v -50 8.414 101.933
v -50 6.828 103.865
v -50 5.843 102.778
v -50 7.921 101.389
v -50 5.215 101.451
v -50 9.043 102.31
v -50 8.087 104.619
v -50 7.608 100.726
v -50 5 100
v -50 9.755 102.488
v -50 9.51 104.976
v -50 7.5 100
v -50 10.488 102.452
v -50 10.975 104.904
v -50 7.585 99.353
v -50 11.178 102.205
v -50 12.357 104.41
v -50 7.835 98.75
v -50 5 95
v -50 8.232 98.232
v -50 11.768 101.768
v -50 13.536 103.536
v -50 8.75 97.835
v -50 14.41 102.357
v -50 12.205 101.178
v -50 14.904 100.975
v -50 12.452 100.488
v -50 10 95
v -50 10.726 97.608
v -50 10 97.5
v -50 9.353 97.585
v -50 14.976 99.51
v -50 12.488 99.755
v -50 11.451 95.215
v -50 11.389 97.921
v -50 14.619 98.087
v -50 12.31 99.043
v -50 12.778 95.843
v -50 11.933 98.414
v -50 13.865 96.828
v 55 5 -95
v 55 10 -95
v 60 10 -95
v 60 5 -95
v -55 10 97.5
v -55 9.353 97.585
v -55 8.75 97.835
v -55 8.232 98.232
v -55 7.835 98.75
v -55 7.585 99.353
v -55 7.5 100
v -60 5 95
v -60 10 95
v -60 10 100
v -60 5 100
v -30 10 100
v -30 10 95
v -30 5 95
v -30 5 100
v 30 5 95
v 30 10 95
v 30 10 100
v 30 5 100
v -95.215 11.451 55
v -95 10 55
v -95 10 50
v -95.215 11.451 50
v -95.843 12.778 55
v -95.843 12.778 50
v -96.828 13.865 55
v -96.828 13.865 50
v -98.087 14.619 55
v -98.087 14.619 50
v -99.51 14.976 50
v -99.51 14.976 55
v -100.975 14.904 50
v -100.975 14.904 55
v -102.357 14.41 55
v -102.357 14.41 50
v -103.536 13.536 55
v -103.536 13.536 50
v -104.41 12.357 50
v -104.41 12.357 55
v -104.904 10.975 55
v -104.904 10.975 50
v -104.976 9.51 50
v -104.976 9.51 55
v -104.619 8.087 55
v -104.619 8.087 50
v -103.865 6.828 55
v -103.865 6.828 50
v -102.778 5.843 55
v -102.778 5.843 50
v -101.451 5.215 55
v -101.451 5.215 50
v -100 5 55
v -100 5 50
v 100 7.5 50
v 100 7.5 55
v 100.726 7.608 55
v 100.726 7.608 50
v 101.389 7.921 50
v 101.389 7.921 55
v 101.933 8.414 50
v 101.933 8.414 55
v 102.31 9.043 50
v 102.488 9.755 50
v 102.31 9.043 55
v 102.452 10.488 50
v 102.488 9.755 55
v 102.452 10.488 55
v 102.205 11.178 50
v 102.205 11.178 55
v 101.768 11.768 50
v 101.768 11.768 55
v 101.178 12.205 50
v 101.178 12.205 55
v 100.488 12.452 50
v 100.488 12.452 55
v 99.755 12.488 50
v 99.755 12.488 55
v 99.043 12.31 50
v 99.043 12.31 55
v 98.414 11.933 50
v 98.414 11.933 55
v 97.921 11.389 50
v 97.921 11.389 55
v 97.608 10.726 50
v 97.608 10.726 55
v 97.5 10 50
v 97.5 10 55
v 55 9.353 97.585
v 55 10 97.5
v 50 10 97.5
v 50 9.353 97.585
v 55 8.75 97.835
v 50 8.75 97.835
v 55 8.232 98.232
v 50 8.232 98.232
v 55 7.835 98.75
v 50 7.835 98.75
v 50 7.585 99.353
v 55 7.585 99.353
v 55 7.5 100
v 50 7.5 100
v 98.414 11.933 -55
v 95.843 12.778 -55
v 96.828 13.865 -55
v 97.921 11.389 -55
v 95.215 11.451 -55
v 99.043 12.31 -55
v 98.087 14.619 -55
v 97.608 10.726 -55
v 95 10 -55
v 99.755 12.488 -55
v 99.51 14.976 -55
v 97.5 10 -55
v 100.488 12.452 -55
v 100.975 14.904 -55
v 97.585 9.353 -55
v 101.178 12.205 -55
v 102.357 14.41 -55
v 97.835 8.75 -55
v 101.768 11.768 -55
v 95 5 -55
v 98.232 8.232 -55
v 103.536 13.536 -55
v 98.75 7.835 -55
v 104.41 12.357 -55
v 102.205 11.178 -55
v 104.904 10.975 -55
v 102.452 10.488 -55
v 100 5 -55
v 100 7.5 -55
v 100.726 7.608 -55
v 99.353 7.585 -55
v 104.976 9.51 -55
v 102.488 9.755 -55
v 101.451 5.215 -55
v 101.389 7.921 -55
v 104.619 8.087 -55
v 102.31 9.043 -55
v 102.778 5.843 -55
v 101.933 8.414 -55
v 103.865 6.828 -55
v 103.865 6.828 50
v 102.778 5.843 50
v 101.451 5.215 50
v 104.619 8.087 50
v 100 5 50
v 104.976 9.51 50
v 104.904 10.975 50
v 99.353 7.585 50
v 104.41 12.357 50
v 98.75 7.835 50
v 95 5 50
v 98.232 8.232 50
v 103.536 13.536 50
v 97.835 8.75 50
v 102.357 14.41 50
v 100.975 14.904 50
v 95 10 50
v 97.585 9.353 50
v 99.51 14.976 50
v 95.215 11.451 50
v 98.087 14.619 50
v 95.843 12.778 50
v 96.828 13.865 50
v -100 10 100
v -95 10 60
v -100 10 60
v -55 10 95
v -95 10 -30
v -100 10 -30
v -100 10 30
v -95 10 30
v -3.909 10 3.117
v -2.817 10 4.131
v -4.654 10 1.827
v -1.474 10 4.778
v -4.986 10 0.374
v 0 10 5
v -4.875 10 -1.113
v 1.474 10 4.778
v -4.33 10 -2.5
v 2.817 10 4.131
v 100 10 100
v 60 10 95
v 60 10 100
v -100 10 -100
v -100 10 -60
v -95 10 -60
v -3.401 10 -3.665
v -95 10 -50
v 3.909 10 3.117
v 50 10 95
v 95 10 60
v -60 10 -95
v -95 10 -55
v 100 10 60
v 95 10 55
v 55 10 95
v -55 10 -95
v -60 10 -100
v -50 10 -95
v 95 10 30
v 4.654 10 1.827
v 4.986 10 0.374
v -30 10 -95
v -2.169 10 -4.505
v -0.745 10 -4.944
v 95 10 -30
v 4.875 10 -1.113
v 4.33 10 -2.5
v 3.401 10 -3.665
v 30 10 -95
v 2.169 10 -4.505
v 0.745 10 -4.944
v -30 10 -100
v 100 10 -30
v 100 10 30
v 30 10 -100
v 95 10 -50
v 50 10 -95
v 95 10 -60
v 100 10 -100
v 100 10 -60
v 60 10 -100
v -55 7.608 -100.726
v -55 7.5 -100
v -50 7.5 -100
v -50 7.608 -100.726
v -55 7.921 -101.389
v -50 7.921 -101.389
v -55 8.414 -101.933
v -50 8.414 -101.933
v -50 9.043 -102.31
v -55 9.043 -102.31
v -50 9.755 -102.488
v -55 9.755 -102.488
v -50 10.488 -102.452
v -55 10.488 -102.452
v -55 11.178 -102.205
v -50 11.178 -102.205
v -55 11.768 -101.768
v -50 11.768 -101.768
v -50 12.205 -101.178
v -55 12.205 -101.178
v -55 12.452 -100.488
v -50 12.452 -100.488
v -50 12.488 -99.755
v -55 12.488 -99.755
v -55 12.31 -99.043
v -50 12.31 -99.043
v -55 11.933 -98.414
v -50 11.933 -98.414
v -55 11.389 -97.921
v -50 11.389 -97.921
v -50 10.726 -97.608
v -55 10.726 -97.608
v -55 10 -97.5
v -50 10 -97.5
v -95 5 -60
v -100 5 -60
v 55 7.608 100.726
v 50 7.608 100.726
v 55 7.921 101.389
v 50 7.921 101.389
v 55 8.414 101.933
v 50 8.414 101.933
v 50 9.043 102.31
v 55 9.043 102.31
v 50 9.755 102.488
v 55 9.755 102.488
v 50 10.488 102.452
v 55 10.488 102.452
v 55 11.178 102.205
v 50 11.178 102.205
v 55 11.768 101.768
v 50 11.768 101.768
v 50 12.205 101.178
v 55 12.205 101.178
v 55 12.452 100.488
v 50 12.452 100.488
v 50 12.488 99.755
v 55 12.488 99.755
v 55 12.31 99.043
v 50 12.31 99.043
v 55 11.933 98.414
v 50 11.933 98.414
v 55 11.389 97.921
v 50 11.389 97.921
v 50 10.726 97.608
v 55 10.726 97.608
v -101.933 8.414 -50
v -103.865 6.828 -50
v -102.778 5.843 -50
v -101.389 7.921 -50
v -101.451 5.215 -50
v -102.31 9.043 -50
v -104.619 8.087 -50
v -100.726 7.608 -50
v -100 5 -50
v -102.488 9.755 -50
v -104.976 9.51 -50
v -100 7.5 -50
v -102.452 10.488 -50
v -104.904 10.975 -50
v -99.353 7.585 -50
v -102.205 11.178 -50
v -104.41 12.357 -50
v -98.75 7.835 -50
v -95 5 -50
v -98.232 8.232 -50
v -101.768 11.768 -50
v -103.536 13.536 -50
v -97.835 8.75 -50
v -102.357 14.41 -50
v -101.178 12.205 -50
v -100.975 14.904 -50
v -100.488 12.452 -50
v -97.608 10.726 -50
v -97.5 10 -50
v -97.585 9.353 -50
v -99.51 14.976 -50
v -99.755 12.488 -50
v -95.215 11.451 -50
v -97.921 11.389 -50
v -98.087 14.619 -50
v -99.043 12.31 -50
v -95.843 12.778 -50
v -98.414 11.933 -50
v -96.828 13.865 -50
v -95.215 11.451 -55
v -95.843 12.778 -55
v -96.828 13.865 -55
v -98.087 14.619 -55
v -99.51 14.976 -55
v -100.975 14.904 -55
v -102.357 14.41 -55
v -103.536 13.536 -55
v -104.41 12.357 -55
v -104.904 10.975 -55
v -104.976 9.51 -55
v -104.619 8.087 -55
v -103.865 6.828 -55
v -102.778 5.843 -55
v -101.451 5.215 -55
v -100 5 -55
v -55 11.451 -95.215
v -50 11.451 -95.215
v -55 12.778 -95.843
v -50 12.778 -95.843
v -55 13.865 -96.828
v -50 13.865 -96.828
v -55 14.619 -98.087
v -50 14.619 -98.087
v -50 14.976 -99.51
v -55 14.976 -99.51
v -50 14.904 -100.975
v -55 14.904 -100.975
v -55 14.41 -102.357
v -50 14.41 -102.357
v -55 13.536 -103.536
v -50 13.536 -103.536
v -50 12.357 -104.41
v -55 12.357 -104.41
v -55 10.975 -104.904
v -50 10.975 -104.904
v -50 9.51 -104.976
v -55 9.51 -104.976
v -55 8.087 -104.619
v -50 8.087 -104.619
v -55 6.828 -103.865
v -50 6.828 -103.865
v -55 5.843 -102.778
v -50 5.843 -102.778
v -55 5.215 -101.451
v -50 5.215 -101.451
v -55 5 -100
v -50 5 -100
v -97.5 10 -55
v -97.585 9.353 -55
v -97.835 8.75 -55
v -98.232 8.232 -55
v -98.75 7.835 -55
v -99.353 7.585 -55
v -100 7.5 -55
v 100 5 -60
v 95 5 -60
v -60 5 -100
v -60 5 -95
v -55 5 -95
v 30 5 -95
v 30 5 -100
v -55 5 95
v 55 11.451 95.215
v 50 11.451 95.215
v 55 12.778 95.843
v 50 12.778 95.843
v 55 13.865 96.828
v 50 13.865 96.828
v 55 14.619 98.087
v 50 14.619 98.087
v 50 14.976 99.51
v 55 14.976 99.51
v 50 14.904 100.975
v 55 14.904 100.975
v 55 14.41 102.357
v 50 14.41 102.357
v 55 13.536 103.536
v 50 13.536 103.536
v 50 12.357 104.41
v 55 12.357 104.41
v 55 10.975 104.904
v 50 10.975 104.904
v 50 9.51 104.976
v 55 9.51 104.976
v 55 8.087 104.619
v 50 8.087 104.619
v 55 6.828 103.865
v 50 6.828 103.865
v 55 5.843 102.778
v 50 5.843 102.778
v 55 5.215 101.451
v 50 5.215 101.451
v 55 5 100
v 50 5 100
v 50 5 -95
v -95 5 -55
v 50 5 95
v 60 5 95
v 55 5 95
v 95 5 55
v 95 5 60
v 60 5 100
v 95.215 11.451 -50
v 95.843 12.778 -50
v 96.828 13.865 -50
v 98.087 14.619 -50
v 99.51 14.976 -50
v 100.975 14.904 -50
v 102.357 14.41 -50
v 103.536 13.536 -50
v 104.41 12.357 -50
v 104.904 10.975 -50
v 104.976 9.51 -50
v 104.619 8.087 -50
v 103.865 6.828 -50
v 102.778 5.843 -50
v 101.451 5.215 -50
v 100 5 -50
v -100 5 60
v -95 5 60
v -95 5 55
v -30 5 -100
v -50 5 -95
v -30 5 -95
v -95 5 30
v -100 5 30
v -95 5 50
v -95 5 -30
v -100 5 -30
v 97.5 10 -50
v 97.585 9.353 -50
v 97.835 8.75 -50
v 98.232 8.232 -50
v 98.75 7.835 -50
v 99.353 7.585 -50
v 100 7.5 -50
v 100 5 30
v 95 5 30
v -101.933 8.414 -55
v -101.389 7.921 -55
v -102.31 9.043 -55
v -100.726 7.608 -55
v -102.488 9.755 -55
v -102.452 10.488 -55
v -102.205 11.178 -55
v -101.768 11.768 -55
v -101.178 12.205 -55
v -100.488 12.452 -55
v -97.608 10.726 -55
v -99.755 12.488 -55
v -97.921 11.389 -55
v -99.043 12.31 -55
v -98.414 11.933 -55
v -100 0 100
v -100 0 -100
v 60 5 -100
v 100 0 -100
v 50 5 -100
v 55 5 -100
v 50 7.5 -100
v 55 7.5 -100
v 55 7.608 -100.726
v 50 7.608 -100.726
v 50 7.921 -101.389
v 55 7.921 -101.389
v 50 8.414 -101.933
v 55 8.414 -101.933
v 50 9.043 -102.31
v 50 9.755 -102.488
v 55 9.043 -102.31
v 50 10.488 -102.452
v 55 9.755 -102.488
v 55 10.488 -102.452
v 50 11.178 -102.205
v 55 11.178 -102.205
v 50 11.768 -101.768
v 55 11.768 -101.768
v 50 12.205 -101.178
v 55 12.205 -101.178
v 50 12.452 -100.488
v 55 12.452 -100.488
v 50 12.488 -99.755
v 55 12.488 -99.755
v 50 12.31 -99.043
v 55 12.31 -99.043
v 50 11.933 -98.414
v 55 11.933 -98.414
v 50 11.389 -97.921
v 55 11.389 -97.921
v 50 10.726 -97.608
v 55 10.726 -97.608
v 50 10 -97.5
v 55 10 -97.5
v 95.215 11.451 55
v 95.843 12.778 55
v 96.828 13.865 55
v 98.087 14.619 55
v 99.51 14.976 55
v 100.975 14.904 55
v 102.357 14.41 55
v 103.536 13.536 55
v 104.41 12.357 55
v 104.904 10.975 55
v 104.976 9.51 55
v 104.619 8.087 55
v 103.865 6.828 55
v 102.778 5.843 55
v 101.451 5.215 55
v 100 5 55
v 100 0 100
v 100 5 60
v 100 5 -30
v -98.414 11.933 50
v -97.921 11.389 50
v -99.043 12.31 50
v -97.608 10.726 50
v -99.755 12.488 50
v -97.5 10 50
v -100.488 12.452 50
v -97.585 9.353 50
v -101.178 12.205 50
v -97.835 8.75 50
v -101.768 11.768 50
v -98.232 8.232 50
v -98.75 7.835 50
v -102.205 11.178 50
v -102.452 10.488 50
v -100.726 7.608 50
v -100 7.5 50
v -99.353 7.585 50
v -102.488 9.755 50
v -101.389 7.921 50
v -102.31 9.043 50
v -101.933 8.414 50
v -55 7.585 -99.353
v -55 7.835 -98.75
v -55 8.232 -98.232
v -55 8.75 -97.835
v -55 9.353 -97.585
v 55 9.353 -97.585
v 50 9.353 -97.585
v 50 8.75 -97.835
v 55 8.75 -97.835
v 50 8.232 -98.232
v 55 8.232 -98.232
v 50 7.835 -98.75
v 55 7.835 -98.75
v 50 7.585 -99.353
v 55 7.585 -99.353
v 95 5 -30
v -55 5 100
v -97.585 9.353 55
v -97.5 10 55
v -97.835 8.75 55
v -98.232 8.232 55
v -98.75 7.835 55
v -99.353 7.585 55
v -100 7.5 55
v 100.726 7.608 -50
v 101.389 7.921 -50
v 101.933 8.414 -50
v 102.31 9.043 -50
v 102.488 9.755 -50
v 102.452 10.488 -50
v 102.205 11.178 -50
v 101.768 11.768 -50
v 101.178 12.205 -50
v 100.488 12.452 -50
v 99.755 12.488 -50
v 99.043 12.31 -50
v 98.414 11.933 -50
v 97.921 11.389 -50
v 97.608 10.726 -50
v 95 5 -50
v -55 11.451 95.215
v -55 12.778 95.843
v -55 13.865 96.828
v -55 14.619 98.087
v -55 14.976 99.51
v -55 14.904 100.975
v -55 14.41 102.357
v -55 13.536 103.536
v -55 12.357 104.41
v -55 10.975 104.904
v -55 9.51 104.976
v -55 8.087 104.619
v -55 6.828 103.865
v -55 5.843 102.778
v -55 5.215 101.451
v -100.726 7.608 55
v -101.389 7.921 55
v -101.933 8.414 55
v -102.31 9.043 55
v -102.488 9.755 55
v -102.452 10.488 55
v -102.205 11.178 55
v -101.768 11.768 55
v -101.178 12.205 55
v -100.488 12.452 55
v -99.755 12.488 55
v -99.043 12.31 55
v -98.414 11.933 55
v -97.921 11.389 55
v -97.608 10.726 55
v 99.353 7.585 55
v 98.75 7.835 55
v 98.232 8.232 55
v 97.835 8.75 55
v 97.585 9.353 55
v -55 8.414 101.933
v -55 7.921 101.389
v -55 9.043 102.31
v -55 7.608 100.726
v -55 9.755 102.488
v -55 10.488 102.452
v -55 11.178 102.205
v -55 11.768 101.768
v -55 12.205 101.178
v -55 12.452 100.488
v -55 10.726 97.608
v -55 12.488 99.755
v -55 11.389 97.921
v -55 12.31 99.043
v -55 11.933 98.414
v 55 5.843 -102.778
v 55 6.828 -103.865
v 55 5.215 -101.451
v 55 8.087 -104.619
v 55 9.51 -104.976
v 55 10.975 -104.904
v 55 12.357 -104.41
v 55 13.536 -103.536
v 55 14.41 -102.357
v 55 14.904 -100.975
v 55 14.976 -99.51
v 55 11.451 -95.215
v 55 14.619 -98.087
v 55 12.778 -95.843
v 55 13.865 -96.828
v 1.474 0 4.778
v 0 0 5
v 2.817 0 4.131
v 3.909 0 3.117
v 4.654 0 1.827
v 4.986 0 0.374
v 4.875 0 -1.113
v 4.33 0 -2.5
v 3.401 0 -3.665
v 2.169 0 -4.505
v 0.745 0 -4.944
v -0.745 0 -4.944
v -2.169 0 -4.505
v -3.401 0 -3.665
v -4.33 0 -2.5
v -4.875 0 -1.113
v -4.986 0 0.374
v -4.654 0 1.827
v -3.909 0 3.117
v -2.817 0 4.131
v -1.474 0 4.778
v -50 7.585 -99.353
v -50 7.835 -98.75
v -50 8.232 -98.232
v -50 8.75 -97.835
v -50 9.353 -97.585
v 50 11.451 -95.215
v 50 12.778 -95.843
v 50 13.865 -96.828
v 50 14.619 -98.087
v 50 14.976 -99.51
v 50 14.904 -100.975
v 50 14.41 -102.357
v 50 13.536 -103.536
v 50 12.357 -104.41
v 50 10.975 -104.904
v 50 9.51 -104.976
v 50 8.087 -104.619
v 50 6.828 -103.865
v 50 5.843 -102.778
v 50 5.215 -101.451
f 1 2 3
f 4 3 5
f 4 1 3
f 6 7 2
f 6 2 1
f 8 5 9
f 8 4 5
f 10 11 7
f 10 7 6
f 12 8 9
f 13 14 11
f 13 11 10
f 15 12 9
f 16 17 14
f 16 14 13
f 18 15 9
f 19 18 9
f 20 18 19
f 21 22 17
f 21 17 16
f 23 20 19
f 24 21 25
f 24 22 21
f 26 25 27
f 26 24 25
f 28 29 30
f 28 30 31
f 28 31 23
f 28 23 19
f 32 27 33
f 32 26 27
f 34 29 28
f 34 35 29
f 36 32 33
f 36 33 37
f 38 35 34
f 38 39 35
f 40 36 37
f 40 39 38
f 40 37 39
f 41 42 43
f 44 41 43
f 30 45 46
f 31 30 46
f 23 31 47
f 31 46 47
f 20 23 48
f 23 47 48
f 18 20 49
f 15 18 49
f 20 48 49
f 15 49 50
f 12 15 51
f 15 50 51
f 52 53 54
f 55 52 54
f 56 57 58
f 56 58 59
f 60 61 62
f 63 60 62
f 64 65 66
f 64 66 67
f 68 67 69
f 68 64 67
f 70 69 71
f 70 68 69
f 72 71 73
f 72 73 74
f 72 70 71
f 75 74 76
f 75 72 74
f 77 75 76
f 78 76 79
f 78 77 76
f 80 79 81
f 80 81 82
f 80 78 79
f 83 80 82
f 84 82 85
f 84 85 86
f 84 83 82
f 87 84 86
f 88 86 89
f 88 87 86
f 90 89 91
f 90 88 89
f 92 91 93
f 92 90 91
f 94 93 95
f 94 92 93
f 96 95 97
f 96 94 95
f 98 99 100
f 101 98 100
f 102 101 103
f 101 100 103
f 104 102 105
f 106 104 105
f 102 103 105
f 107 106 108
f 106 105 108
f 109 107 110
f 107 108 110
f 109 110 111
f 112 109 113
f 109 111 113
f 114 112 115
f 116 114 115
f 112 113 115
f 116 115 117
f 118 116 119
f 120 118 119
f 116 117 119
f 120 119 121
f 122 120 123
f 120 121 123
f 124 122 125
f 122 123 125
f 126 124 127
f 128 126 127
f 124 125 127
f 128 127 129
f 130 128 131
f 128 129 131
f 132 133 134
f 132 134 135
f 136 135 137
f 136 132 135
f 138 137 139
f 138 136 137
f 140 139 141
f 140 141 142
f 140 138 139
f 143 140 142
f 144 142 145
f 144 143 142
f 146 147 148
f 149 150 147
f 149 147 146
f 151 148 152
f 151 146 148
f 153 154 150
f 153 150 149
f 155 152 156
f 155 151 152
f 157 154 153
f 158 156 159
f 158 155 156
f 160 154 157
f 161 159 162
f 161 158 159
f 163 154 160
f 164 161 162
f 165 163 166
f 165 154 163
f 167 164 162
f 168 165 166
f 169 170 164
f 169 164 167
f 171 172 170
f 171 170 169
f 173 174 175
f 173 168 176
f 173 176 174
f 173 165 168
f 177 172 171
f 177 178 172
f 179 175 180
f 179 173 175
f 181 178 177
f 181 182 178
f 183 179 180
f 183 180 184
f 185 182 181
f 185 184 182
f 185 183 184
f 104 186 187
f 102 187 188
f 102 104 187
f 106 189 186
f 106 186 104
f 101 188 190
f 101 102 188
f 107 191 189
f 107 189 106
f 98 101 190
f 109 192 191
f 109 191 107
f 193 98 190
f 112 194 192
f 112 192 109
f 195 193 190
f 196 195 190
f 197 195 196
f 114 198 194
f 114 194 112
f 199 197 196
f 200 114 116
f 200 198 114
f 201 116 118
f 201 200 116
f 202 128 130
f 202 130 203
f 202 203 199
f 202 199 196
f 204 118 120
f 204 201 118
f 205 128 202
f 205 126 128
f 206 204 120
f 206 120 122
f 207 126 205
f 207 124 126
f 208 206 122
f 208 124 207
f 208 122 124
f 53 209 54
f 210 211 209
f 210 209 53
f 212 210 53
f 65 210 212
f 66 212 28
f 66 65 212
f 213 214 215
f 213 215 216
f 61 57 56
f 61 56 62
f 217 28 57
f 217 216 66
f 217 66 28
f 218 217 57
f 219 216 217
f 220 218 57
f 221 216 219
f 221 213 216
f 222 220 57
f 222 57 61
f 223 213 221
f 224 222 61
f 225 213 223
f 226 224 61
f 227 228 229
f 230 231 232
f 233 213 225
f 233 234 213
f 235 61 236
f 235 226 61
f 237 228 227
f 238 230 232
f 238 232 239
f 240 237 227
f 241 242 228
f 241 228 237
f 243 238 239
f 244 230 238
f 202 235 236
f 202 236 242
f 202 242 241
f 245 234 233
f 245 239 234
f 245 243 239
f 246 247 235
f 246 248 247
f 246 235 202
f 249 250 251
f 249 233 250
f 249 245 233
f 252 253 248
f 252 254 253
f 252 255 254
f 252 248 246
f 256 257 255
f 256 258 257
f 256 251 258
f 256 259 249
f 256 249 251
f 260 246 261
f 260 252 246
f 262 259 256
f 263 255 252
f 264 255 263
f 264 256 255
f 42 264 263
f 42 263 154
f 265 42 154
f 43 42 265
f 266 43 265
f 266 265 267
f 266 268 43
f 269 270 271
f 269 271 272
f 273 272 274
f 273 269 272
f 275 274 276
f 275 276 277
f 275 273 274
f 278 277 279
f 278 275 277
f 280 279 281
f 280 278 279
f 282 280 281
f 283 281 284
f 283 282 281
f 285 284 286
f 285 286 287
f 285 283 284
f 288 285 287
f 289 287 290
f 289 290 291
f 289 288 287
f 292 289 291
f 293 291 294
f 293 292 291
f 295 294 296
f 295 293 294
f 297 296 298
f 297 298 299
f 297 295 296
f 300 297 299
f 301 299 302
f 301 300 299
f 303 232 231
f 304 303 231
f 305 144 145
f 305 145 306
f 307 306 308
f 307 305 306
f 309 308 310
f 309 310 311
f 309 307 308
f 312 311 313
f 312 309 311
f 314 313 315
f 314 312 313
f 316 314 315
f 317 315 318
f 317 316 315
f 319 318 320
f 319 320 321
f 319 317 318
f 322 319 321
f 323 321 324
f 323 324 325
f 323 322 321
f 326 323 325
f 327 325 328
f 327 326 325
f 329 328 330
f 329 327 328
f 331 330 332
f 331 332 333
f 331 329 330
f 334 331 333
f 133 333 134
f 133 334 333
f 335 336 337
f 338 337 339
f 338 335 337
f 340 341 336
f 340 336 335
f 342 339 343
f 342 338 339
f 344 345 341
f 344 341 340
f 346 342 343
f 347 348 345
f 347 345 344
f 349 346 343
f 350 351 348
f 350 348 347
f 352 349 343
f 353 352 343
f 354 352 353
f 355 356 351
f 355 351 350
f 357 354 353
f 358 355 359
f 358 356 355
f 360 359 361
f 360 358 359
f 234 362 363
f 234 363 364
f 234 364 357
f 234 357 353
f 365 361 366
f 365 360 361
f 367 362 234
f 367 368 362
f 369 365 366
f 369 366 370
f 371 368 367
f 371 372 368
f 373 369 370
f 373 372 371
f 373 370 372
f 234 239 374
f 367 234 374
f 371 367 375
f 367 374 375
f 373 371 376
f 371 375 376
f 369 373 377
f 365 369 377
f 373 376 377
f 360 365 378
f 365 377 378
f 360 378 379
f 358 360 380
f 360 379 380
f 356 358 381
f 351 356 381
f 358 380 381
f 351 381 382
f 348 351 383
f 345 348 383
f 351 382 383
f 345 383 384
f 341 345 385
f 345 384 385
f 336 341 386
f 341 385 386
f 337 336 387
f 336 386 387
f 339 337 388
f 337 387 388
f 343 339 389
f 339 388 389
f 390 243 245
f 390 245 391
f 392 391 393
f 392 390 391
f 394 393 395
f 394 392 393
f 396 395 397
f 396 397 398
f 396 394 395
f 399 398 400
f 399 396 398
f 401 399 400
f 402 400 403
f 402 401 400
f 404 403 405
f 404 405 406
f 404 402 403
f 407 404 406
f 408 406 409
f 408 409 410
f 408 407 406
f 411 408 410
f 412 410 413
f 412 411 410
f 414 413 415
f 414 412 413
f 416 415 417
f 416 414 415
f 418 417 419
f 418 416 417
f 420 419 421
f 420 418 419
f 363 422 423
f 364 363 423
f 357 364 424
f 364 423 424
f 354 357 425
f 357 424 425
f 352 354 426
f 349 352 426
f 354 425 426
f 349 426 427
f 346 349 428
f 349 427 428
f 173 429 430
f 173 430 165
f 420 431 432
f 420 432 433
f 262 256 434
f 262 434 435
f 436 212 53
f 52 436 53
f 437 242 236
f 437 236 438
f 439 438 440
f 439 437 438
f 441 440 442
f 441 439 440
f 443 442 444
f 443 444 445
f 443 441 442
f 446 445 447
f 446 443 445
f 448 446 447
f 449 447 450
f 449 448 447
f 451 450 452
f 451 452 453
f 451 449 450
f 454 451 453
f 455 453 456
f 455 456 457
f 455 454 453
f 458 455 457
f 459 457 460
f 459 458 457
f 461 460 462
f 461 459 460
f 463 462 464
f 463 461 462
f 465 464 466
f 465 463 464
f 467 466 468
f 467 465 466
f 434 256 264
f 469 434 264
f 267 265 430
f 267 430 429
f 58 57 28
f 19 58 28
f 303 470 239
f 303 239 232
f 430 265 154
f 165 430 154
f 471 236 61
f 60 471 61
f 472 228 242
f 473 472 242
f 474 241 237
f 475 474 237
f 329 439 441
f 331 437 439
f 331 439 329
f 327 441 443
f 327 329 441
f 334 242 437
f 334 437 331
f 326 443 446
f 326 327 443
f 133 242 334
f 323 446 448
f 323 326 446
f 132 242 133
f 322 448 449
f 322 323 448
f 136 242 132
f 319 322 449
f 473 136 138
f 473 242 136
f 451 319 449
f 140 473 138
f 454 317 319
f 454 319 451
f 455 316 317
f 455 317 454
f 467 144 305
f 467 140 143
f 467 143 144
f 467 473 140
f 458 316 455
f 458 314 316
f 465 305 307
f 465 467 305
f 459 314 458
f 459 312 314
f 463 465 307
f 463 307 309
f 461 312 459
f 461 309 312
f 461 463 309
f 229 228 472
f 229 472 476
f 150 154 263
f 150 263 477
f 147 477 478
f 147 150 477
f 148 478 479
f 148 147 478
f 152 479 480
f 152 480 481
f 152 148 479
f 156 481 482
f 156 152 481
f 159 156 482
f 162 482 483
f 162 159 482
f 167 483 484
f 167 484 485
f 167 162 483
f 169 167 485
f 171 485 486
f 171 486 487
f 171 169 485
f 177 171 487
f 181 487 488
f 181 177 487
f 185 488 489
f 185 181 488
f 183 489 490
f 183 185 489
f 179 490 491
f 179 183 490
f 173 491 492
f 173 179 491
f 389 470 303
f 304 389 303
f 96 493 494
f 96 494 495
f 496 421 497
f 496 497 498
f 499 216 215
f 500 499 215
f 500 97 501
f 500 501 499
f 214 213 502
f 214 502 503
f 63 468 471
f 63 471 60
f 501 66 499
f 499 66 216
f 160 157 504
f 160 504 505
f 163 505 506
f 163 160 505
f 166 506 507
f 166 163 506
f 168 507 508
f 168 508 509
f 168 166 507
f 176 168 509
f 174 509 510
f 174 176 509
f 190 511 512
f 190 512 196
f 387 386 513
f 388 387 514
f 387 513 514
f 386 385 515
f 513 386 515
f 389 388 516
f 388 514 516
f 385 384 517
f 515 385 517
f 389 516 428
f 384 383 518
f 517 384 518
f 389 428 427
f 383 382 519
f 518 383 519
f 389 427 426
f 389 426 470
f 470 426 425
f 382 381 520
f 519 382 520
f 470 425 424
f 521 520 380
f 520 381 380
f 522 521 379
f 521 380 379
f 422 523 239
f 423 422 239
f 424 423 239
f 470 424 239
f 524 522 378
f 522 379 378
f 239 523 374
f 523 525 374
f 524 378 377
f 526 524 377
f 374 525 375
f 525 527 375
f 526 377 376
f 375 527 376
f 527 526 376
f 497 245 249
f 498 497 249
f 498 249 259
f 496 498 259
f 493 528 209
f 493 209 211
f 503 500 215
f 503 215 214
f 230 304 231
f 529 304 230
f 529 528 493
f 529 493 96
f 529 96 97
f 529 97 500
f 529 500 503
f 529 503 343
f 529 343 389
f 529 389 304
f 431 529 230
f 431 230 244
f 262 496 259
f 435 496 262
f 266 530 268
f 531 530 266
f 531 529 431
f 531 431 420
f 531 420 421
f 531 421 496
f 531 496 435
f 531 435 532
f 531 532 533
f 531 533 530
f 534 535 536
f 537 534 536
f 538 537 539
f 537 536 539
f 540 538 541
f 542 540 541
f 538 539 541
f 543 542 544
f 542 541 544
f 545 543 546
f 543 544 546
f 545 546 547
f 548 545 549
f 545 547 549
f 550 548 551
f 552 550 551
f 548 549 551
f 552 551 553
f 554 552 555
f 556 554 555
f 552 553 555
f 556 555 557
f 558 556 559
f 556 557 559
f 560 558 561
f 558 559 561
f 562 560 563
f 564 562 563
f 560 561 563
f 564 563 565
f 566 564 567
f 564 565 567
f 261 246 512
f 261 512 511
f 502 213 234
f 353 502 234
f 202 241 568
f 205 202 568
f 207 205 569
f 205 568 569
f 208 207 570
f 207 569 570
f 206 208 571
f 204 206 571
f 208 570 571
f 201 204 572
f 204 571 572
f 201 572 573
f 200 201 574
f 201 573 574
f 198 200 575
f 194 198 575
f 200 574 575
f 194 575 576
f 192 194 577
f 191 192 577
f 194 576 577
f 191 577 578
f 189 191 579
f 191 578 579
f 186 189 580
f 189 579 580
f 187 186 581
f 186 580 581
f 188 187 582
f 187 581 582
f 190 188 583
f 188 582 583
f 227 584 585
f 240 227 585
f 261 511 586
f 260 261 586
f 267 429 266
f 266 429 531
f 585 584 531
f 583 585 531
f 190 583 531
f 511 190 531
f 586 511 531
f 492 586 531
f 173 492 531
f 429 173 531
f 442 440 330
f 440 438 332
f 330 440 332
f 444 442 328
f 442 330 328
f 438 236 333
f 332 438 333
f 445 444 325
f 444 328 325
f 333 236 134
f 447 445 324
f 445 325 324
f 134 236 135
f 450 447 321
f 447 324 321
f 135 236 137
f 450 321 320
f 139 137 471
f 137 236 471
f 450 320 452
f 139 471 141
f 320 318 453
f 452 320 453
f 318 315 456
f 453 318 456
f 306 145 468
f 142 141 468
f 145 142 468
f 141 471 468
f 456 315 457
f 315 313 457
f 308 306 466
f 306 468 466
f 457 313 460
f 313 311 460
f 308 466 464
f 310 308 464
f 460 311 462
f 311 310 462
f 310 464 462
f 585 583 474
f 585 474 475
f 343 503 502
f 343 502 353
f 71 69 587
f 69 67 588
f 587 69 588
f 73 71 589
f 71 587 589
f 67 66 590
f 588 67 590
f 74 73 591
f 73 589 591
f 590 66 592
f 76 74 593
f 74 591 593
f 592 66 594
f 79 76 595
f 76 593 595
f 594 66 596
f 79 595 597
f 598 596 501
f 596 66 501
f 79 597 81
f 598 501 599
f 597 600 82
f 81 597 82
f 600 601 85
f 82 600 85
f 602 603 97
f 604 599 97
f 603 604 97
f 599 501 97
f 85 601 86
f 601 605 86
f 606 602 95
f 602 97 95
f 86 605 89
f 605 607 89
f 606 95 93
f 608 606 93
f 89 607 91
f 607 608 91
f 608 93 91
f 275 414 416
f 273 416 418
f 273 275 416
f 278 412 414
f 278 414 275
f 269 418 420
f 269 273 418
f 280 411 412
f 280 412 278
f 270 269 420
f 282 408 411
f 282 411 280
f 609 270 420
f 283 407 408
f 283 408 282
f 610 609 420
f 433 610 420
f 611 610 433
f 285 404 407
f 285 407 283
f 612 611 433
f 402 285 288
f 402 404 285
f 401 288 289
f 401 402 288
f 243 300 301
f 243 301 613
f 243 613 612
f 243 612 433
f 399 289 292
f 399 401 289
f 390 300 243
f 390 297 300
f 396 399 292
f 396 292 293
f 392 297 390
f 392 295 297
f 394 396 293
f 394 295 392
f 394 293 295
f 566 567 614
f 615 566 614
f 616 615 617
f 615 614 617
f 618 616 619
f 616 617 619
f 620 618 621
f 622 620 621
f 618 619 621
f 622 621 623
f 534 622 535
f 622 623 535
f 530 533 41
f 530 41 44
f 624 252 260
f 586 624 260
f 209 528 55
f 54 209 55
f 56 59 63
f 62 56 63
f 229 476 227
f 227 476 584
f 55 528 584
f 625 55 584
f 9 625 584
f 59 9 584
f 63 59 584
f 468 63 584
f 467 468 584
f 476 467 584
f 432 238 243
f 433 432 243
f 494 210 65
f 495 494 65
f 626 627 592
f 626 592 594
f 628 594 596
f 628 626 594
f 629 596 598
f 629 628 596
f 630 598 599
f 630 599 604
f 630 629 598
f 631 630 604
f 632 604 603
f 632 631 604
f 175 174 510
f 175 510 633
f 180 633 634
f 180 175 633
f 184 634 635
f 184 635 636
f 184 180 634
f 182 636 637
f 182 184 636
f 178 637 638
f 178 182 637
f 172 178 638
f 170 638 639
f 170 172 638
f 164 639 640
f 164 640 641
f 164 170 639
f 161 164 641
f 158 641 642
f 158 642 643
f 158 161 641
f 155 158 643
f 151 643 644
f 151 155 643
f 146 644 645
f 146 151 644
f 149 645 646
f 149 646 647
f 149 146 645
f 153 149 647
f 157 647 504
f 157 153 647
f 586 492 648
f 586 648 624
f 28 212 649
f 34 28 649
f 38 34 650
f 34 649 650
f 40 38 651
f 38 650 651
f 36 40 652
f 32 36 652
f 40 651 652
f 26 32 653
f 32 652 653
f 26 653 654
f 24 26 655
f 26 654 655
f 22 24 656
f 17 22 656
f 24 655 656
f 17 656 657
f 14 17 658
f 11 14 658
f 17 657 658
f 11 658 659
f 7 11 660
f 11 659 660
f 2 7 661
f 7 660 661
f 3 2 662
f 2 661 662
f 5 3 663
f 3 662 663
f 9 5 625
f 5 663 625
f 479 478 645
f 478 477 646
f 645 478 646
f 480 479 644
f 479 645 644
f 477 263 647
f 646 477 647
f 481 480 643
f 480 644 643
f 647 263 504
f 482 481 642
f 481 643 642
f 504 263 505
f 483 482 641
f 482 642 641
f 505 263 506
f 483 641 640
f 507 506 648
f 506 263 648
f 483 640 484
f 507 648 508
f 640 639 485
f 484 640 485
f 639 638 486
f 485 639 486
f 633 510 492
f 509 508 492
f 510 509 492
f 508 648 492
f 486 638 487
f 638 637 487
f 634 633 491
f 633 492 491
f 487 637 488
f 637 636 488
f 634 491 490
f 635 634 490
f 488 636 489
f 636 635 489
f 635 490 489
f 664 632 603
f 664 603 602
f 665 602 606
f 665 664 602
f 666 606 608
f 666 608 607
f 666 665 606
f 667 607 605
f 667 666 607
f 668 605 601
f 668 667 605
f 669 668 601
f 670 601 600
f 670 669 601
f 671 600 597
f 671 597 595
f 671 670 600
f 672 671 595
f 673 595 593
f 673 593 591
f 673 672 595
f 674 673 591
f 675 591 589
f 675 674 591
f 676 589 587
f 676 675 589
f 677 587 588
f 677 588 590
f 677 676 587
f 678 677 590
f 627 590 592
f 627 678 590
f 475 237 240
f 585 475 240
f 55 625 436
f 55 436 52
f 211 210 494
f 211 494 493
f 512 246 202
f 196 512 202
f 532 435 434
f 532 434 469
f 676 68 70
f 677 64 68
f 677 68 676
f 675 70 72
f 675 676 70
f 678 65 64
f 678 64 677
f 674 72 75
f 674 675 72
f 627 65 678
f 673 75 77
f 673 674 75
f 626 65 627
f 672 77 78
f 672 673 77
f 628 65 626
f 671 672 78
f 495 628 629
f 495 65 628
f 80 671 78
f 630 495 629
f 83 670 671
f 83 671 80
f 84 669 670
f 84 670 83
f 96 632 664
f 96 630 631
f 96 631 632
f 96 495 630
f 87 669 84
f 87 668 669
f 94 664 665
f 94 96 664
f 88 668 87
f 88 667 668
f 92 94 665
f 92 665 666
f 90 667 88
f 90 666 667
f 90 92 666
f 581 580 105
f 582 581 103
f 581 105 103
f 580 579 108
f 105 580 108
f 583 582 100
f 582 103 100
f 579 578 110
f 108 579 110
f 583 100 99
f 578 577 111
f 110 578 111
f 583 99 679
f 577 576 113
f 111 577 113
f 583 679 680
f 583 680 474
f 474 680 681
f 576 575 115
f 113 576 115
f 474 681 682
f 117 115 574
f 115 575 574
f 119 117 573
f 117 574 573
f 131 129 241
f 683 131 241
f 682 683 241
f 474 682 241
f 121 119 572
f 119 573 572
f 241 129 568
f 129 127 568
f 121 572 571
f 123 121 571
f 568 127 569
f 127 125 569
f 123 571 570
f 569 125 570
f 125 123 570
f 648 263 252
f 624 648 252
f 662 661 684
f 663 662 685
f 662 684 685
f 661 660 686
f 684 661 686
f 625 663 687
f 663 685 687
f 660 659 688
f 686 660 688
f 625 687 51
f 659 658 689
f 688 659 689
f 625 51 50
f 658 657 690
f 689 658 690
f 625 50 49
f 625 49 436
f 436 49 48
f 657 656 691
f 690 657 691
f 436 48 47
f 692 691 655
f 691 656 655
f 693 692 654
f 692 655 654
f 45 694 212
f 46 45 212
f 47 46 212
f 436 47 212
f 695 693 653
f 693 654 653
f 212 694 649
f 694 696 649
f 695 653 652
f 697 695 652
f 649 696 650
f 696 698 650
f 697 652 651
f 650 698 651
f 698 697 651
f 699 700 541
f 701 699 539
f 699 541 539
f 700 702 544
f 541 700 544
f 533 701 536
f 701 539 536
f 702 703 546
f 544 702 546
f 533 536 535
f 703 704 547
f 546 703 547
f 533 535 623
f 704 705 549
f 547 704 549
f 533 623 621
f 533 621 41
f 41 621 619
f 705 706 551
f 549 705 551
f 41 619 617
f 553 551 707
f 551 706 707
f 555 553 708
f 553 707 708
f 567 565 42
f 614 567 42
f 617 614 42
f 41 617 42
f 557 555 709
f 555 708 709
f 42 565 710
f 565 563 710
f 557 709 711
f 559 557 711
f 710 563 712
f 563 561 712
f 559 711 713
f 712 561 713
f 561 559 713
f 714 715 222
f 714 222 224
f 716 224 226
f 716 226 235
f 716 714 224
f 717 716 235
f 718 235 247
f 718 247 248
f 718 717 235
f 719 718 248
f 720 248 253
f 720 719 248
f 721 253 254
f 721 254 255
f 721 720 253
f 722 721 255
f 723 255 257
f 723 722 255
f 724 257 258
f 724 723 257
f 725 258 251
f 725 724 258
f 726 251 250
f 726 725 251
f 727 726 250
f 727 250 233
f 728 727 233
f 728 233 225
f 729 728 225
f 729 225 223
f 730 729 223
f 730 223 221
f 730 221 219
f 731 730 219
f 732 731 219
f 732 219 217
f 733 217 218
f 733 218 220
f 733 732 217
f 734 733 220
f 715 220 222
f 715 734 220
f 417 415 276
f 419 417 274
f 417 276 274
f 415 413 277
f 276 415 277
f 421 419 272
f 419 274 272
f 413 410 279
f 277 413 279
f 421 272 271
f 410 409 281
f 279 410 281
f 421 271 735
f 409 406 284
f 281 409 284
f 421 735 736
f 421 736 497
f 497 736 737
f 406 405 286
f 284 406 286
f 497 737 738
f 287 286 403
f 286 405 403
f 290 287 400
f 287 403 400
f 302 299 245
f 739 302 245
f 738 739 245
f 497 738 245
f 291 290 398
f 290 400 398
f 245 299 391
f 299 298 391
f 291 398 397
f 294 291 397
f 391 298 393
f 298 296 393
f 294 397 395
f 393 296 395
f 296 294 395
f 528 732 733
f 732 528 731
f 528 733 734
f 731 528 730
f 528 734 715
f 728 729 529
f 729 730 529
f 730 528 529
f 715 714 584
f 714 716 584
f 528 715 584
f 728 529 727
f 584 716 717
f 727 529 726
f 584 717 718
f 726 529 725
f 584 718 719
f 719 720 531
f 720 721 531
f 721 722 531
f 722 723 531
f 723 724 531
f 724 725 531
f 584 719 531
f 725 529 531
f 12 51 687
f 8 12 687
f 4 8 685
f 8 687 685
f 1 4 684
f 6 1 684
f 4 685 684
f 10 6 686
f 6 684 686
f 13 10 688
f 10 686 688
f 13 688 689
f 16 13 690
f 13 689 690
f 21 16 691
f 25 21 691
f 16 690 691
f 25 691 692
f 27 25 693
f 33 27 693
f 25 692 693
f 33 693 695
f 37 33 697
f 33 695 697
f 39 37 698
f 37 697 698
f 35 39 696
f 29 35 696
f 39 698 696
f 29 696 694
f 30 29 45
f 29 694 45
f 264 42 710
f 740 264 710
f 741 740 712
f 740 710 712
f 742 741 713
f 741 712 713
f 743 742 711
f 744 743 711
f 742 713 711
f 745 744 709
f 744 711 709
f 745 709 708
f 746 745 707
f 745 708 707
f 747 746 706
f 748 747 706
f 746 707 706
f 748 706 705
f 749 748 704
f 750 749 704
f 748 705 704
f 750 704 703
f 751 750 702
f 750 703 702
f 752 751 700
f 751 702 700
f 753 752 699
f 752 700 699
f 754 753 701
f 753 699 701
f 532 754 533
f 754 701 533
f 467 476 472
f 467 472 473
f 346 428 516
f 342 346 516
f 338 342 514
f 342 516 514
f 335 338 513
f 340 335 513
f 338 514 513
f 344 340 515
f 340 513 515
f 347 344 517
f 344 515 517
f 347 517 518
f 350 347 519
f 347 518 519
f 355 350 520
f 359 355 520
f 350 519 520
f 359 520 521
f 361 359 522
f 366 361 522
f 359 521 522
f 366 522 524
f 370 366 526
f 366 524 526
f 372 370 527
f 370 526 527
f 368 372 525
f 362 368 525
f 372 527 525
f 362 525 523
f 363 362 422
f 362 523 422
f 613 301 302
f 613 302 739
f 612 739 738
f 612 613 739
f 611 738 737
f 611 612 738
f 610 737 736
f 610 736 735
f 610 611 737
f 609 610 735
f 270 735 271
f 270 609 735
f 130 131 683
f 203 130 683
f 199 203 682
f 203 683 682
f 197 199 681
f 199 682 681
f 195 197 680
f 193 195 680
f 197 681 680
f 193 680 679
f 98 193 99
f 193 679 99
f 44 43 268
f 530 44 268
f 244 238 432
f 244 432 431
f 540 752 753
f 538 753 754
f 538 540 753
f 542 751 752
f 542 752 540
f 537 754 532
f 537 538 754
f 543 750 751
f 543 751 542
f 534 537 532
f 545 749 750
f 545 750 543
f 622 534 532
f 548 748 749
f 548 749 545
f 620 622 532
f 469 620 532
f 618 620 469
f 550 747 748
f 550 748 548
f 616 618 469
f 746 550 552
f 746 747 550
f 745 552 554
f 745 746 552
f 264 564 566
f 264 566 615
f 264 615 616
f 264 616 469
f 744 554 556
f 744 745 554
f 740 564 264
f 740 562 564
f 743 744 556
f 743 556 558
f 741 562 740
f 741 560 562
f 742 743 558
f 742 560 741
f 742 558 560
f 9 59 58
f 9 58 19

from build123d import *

# Parameters (mm, degrees)
SKETCH1_W                = 200
SKETCH1_H                = 200
SKETCH1_R                = 5
BOSS_EXTRUDE1_DEPTH      = 10
SKETCH2_W                = 30
SKETCH2_H                = 5
CUT_EXTRUDE1_DEPTH       = 5
BOSS_EXTRUDE3_START      = 5
BOSS_EXTRUDE3_DEPTH      = 5
CIRPATTERN1_COUNT        = 4
CIRPATTERN1_START        = 5
CIRPATTERN1_COPY_1_DEPTH = 5
CIRPATTERN1_COPY_2_DEPTH = 5
CIRPATTERN1_COPY_3_DEPTH = 5


with BuildPart() as part:
    # Sketch1 → Boss-Extrude1 (new body)
    with BuildSketch(Plane(origin=(0, 0, 0), x_dir=(1, 0, 0), z_dir=(0, 1, 0))):
        Rectangle(SKETCH1_W, SKETCH1_H)
        with Locations(Location((0, 0, 0), (0, 0, 270))):
            Circle(SKETCH1_R, mode=Mode.SUBTRACT)
    extrude(amount=BOSS_EXTRUDE1_DEPTH)

    # Sketch2 → Cut-Extrude1 (cut)
    with BuildSketch(Plane(origin=(0, 10, 0), x_dir=(1, 0, 0), z_dir=(0, 1, 0))):
        with Locations((45, 97.5)):
            Rectangle(SKETCH2_W, SKETCH2_H)
        with Locations((-45, 97.5)):
            Rectangle(SKETCH2_W, SKETCH2_H)
    cut_extrude1 = extrude(amount=-CUT_EXTRUDE1_DEPTH, mode=Mode.SUBTRACT)

    # Sketch3 → Boss-Extrude3 (add)
    with BuildSketch(Plane.ZY.offset(-60).offset(BOSS_EXTRUDE3_START)):
        with BuildLine():
            Line((-97.5, 10), (-95, 10))
            ThreePointArc((-95, 10), (-103.535533906, 13.535533906), (-100, 5))
            Line((-100, 5), (-100, 7.5))
            ThreePointArc((-100, 7.5), (-101.767766953, 11.767766953), (-97.5, 10))
        make_face()
        with BuildLine():
            ThreePointArc((-100, 5), (-96.464466094, 6.464466094), (-95, 10))
            Line((-95, 10), (-97.5, 10))
            ThreePointArc((-97.5, 10), (-98.232233047, 8.232233047), (-100, 7.5))
            Line((-100, 7.5), (-100, 5))
        make_face()
        with BuildLine():
            Line((-95, 5), (-95, 10))
            ThreePointArc((-95, 10), (-96.464466094, 6.464466094), (-100, 5))
            Line((-100, 5), (-95, 5))
        make_face()
    boss_extrude3 = extrude(amount=BOSS_EXTRUDE3_DEPTH)

    # Mirror1: Boss-Extrude3 across plane
    add(boss_extrude3.mirror(Plane(origin=(0, 0, 0), x_dir=(0, 0, 1), z_dir=(1, 0, 0))))

    # CirPattern1: Cut-Extrude1, Boss-Extrude3 ×4 about axis
    cirpattern1_axis = Axis((0, 0, 0), (0, 1, 0))
    add([cut_extrude1.rotate(cirpattern1_axis, i * 360 / CIRPATTERN1_COUNT) for i in range(1, CIRPATTERN1_COUNT)], mode=Mode.SUBTRACT)
    add([boss_extrude3.rotate(cirpattern1_axis, i * 360 / CIRPATTERN1_COUNT) for i in range(1, CIRPATTERN1_COUNT)])

    # CirPattern1 copy 1 sketch → CirPattern1 copy 1 (add)
    with BuildSketch(Plane(origin=(0, 0, 60), x_dir=(1, 0, 0), z_dir=(0, 0, -1)).offset(CIRPATTERN1_START)):
        with BuildLine():
            Line((-97.5, -10), (-95, -10))
            ThreePointArc((-95, -10), (-103.535533906, -13.535533906), (-100, -5))
            Line((-100, -5), (-100, -7.5))
            ThreePointArc((-100, -7.5), (-101.767766953, -11.767766953), (-97.5, -10))
        make_face()
        with BuildLine():
            ThreePointArc((-100, -5), (-96.464466094, -6.464466094), (-95, -10))
            Line((-95, -10), (-97.5, -10))
            ThreePointArc((-97.5, -10), (-98.232233047, -8.232233047), (-100, -7.5))
            Line((-100, -7.5), (-100, -5))
        make_face()
        with BuildLine():
            Line((-95, -5), (-95, -10))
            ThreePointArc((-95, -10), (-96.464466094, -6.464466094), (-100, -5))
            Line((-100, -5), (-95, -5))
        make_face()
    extrude(amount=CIRPATTERN1_COPY_1_DEPTH)

    # CirPattern1 copy 2 sketch → CirPattern1 copy 2 (add)
    with BuildSketch(Plane(origin=(60, 0, 0), x_dir=(0, 0, -1), z_dir=(-1, 0, 0)).offset(CIRPATTERN1_START)):
        with BuildLine():
            Line((-97.5, -10), (-95, -10))
            ThreePointArc((-95, -10), (-103.535533906, -13.535533906), (-100, -5))
            Line((-100, -5), (-100, -7.5))
            ThreePointArc((-100, -7.5), (-101.767766953, -11.767766953), (-97.5, -10))
        make_face()
        with BuildLine():
            ThreePointArc((-100, -5), (-96.464466094, -6.464466094), (-95, -10))
            Line((-95, -10), (-97.5, -10))
            ThreePointArc((-97.5, -10), (-98.232233047, -8.232233047), (-100, -7.5))
            Line((-100, -7.5), (-100, -5))
        make_face()
        with BuildLine():
            Line((-95, -5), (-95, -10))
            ThreePointArc((-95, -10), (-96.464466094, -6.464466094), (-100, -5))
            Line((-100, -5), (-95, -5))
        make_face()
    extrude(amount=CIRPATTERN1_COPY_2_DEPTH)

    # CirPattern1 copy 3 sketch → CirPattern1 copy 3 (add)
    with BuildSketch(Plane(origin=(0, 0, -60), x_dir=(-1, 0, 0), z_dir=(0, 0, 1)).offset(CIRPATTERN1_START)):
        with BuildLine():
            Line((-97.5, -10), (-95, -10))
            ThreePointArc((-95, -10), (-103.535533906, -13.535533906), (-100, -5))
            Line((-100, -5), (-100, -7.5))
            ThreePointArc((-100, -7.5), (-101.767766953, -11.767766953), (-97.5, -10))
        make_face()
        with BuildLine():
            ThreePointArc((-100, -5), (-96.464466094, -6.464466094), (-95, -10))
            Line((-95, -10), (-97.5, -10))
            ThreePointArc((-97.5, -10), (-98.232233047, -8.232233047), (-100, -7.5))
            Line((-100, -7.5), (-100, -5))
        make_face()
        with BuildLine():
            Line((-95, -5), (-95, -10))
            ThreePointArc((-95, -10), (-96.464466094, -6.464466094), (-100, -5))
            Line((-100, -5), (-95, -5))
        make_face()
    extrude(amount=CIRPATTERN1_COPY_3_DEPTH)


solid = part.part
